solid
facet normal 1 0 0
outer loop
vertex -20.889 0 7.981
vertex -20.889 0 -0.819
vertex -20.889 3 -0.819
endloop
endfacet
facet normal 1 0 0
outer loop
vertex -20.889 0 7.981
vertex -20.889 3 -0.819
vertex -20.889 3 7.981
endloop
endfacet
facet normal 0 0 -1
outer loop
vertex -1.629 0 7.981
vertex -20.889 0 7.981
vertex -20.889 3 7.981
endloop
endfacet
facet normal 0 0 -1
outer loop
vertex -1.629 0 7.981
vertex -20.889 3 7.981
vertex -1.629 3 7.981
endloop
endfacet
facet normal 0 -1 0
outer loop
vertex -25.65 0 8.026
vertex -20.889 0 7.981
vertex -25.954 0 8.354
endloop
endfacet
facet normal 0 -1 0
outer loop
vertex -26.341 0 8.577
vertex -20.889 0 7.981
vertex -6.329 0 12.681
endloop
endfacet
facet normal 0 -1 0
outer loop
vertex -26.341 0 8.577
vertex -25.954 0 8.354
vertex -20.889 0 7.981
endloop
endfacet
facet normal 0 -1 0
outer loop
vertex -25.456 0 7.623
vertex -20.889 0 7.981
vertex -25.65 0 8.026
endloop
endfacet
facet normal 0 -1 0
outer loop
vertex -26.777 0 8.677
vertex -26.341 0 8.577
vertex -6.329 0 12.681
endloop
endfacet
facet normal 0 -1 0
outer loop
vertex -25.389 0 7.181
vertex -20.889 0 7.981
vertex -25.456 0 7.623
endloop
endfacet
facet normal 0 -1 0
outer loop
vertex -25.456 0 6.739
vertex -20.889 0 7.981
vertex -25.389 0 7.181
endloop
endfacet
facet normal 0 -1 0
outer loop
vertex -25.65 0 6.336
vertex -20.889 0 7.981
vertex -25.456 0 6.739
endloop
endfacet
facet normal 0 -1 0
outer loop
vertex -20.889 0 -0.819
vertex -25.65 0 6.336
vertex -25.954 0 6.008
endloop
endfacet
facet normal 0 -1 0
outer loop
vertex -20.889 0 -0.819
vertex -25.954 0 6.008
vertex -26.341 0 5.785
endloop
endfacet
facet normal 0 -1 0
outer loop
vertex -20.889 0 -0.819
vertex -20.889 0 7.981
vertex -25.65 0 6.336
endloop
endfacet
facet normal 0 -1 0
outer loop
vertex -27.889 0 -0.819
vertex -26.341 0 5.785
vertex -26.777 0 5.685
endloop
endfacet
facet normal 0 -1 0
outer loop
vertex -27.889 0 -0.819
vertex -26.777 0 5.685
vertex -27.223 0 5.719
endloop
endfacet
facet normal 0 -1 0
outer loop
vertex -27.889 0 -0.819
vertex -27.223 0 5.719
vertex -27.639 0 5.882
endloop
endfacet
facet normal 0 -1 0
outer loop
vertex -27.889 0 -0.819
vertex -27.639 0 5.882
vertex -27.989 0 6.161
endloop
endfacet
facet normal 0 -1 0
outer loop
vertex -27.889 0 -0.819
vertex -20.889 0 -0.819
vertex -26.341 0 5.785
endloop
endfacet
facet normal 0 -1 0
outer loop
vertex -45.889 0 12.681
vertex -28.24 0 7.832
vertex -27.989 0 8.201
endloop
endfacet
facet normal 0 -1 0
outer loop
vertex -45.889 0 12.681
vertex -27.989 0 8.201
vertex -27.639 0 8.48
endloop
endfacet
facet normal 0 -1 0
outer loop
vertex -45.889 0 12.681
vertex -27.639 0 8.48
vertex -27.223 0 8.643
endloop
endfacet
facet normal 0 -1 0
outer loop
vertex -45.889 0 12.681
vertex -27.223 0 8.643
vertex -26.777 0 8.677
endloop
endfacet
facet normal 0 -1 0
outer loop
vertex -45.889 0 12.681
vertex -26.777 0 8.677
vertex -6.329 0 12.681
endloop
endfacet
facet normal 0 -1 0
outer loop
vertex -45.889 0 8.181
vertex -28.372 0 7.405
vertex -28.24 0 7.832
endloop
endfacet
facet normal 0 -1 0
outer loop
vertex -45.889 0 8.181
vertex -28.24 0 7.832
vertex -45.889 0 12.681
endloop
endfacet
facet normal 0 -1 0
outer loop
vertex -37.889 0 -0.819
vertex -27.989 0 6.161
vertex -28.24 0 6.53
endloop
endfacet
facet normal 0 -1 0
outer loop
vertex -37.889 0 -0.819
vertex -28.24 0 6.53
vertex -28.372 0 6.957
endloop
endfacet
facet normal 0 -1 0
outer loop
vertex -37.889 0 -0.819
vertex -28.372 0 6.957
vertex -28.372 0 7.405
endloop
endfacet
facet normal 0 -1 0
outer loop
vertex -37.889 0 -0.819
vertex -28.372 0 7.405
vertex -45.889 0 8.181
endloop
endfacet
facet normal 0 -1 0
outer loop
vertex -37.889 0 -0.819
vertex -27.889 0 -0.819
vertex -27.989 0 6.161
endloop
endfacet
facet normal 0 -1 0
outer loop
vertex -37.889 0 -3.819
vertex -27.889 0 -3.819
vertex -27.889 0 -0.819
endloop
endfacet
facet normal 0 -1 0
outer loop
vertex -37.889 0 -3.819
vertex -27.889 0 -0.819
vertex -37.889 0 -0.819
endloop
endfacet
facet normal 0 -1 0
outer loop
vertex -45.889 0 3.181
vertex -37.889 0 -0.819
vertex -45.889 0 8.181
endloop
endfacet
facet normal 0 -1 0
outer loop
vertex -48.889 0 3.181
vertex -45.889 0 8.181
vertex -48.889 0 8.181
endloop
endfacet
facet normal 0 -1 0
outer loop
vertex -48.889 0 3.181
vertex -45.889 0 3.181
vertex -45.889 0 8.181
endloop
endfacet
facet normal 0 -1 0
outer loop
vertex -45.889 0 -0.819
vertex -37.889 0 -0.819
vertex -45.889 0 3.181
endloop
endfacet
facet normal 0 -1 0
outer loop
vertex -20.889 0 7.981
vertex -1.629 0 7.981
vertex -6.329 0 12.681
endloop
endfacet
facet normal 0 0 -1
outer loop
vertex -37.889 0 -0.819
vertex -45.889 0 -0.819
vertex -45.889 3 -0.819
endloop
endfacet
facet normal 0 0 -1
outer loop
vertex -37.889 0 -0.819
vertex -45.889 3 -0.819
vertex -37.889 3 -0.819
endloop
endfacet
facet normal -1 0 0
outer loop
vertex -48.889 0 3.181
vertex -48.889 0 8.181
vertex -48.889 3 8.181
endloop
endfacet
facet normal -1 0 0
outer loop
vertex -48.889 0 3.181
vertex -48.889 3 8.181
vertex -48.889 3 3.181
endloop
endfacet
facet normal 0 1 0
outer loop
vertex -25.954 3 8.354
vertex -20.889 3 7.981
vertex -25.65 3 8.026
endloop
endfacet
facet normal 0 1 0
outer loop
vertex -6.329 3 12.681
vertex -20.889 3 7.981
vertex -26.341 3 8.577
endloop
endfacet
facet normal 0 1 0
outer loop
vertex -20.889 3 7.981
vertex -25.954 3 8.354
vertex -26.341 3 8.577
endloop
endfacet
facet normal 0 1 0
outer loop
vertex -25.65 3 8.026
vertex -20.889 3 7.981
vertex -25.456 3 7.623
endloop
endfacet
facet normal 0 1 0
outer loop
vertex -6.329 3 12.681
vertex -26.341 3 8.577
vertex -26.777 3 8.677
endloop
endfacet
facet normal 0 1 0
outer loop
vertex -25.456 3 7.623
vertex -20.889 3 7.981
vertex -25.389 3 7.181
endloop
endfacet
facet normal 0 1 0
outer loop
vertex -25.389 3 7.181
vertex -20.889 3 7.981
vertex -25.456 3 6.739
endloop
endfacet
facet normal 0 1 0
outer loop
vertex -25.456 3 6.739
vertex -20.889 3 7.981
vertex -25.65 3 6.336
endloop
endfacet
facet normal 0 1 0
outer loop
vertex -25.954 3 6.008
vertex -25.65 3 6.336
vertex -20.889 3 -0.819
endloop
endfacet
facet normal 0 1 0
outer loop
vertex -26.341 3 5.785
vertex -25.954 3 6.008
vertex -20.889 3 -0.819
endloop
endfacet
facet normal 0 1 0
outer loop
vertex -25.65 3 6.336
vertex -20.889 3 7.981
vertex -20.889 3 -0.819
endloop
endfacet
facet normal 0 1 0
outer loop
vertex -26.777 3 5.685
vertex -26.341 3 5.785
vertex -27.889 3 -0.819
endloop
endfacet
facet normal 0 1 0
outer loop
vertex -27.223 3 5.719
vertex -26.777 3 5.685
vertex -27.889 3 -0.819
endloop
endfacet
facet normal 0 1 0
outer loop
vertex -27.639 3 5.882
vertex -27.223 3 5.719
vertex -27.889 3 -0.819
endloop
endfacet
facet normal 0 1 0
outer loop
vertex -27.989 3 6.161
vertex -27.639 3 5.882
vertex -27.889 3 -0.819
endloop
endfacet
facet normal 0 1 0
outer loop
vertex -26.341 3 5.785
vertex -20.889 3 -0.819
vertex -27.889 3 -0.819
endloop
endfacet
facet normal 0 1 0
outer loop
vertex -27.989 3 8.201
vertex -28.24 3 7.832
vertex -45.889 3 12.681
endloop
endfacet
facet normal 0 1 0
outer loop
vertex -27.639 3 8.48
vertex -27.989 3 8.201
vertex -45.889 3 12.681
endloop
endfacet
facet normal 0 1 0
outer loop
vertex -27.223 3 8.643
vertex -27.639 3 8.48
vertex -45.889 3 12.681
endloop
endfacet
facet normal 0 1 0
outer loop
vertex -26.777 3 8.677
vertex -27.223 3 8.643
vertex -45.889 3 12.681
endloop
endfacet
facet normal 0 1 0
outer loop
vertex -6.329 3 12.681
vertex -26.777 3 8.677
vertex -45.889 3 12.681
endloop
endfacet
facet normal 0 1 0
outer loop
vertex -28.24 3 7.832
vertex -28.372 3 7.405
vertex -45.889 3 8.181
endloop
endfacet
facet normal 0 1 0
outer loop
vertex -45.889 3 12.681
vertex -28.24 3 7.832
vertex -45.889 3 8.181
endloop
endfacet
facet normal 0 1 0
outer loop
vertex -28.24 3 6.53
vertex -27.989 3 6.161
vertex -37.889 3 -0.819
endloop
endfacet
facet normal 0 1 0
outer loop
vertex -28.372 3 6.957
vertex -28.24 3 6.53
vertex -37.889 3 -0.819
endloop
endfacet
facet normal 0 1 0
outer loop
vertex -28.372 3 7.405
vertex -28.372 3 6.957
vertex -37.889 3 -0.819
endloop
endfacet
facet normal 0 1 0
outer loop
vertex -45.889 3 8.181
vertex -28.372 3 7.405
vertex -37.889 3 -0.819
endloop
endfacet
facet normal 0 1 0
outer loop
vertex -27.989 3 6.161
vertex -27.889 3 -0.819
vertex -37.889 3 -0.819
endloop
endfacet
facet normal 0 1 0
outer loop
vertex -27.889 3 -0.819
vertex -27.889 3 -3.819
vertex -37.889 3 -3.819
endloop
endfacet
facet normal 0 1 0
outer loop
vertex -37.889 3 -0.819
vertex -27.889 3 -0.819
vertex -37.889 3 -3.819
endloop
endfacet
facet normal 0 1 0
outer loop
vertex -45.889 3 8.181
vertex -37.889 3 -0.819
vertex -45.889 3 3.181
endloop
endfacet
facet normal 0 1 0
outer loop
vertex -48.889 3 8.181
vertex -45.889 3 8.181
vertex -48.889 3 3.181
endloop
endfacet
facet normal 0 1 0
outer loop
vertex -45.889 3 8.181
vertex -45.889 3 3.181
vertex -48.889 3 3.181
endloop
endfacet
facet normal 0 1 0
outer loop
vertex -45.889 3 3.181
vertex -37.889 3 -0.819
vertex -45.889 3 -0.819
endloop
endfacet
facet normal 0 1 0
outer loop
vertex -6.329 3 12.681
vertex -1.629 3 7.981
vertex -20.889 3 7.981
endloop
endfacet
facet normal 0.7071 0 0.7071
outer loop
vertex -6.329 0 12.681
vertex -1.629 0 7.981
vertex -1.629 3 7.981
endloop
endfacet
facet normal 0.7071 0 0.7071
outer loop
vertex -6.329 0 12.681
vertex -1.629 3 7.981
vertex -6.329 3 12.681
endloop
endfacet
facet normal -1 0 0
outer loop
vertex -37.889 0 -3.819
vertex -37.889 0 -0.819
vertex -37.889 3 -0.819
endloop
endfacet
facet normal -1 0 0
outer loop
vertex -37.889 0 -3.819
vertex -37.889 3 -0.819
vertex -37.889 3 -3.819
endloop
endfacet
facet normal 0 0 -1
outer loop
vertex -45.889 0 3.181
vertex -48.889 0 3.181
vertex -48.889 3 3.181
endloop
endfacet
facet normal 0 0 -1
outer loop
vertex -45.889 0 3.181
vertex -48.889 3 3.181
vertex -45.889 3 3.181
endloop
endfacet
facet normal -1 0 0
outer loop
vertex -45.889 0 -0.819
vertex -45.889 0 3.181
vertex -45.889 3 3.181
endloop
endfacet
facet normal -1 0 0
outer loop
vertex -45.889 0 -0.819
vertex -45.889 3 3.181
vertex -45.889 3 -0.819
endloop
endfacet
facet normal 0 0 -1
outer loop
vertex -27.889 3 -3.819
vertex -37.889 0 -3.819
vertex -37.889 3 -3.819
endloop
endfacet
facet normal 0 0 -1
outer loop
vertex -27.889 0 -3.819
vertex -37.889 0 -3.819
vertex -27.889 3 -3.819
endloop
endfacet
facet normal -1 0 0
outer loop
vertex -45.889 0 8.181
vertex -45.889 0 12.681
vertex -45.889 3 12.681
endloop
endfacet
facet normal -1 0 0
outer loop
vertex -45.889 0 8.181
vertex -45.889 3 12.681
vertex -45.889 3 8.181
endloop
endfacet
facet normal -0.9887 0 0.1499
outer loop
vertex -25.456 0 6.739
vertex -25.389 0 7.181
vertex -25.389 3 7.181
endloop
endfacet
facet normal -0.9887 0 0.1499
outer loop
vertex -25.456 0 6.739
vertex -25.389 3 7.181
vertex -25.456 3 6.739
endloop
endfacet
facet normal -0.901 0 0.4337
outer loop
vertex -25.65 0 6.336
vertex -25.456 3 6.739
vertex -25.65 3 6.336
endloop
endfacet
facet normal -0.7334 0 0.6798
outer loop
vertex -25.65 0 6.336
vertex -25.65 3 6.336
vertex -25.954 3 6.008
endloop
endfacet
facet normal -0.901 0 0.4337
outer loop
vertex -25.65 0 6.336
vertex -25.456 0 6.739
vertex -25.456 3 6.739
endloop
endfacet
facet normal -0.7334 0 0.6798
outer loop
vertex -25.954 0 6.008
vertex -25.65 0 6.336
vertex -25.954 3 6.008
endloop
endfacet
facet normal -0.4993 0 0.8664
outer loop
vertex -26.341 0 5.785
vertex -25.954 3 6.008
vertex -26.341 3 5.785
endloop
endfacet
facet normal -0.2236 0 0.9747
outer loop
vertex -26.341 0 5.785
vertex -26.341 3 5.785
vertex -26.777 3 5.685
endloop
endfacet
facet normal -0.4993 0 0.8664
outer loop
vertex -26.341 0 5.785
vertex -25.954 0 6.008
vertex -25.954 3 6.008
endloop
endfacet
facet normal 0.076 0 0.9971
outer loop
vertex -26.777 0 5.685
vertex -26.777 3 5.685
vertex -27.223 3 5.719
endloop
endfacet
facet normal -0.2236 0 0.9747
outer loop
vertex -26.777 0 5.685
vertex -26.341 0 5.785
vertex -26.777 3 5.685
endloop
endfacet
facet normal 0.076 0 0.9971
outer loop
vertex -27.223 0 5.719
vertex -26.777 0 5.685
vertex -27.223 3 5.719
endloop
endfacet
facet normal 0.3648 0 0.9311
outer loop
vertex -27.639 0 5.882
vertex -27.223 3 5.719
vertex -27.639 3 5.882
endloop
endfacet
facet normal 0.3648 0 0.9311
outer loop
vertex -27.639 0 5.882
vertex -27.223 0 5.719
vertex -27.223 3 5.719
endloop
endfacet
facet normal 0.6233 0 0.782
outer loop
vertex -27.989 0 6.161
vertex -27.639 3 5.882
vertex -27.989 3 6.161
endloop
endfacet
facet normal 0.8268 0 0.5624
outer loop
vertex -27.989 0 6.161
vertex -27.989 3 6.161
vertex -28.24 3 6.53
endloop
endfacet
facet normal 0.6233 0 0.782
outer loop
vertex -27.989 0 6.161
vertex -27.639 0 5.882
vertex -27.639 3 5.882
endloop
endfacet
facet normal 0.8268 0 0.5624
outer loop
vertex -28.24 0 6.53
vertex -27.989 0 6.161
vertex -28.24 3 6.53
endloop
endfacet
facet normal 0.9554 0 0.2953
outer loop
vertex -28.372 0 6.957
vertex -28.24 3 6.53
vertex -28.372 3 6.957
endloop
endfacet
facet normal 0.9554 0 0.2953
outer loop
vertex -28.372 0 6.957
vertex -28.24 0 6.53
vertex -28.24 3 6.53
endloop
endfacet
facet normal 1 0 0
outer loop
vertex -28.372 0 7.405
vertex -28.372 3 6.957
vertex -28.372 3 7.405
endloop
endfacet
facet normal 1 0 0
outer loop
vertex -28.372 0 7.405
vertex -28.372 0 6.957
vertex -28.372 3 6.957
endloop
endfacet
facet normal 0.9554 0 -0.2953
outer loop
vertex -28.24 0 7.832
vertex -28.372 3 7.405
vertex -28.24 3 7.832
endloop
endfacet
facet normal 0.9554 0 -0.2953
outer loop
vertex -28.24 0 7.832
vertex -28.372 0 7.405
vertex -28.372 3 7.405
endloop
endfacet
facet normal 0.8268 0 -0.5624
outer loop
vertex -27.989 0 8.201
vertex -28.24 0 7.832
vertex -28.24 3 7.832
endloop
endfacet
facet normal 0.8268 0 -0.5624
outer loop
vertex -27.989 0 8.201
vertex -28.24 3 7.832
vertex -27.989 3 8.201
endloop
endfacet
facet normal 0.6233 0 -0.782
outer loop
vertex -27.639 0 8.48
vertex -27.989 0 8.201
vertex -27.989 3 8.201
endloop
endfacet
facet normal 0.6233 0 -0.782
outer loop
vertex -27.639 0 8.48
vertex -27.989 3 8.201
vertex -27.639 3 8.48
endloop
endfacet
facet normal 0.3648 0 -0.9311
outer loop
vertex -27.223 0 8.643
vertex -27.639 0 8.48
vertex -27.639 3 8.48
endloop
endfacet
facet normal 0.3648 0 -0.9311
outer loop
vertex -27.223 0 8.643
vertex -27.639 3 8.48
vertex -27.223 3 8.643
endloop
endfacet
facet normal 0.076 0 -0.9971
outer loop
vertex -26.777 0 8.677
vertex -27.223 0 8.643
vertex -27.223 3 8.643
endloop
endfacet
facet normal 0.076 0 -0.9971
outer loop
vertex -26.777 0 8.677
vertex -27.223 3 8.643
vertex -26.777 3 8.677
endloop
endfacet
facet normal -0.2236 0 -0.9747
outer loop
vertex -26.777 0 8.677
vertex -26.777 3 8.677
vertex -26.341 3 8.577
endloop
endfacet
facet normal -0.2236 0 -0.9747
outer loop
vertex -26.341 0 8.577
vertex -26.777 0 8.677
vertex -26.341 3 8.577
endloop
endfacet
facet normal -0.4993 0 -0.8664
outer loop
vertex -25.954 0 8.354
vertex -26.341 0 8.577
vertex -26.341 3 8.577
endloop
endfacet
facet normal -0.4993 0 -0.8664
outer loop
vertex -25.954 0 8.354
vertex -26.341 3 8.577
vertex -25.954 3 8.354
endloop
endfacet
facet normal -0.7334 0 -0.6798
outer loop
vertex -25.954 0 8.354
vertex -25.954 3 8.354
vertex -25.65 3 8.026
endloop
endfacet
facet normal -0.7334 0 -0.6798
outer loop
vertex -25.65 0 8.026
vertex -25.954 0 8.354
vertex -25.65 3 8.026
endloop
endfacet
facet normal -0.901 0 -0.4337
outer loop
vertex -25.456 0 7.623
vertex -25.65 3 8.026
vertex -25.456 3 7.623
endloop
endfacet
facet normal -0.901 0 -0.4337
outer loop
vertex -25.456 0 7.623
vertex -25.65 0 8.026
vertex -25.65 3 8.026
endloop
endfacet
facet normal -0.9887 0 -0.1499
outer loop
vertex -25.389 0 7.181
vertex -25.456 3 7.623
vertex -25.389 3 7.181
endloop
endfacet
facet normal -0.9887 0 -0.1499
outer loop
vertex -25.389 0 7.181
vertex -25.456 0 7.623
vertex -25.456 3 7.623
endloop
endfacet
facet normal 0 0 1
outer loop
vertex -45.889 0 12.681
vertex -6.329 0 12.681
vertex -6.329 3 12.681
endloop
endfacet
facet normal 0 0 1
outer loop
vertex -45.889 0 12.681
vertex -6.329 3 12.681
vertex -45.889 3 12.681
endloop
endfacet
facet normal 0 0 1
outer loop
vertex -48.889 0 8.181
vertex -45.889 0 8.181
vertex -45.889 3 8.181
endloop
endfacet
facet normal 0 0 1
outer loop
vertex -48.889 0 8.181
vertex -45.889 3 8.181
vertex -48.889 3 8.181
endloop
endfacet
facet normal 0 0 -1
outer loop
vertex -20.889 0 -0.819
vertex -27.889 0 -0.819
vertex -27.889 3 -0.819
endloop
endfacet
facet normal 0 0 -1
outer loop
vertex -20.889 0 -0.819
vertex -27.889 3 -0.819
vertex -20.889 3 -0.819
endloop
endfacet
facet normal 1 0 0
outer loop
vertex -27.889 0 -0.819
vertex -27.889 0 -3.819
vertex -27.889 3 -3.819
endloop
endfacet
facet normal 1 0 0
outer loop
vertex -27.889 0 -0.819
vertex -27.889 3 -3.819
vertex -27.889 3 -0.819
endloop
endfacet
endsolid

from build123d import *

# Parameters (mm, degrees)
SKETCH1_R           = 1.5
BOSS_EXTRUDE1_DEPTH = 3


with BuildPart() as part:
    # Sketch1 → Boss-Extrude1 (new body)
    with BuildSketch(Plane(origin=(0, 0, 0), x_dir=(1, 0, 0), z_dir=(0, 1, 0))):
        Polygon((-37.889024654, 3.81895344), (-27.889024654, 3.81895344), (-27.889024654, 0.81895344), (-20.889024654, 0.81895344), (-20.889024654, -7.98104656), (-1.629024654, -7.98104656), (-6.329024654, -12.68104656), (-45.889024654, -12.68104656), (-45.889024654, -8.18104656), (-48.889024654, -8.18104656), (-48.889024654, -3.18104656), (-45.889024654, -3.18104656), (-45.889024654, 0.81895344), (-37.889024654, 0.81895344), align=None)
        with Locations((-26.889024654, -7.18104656)):
            Circle(SKETCH1_R, mode=Mode.SUBTRACT)
    extrude(amount=BOSS_EXTRUDE1_DEPTH)


solid = part.part
